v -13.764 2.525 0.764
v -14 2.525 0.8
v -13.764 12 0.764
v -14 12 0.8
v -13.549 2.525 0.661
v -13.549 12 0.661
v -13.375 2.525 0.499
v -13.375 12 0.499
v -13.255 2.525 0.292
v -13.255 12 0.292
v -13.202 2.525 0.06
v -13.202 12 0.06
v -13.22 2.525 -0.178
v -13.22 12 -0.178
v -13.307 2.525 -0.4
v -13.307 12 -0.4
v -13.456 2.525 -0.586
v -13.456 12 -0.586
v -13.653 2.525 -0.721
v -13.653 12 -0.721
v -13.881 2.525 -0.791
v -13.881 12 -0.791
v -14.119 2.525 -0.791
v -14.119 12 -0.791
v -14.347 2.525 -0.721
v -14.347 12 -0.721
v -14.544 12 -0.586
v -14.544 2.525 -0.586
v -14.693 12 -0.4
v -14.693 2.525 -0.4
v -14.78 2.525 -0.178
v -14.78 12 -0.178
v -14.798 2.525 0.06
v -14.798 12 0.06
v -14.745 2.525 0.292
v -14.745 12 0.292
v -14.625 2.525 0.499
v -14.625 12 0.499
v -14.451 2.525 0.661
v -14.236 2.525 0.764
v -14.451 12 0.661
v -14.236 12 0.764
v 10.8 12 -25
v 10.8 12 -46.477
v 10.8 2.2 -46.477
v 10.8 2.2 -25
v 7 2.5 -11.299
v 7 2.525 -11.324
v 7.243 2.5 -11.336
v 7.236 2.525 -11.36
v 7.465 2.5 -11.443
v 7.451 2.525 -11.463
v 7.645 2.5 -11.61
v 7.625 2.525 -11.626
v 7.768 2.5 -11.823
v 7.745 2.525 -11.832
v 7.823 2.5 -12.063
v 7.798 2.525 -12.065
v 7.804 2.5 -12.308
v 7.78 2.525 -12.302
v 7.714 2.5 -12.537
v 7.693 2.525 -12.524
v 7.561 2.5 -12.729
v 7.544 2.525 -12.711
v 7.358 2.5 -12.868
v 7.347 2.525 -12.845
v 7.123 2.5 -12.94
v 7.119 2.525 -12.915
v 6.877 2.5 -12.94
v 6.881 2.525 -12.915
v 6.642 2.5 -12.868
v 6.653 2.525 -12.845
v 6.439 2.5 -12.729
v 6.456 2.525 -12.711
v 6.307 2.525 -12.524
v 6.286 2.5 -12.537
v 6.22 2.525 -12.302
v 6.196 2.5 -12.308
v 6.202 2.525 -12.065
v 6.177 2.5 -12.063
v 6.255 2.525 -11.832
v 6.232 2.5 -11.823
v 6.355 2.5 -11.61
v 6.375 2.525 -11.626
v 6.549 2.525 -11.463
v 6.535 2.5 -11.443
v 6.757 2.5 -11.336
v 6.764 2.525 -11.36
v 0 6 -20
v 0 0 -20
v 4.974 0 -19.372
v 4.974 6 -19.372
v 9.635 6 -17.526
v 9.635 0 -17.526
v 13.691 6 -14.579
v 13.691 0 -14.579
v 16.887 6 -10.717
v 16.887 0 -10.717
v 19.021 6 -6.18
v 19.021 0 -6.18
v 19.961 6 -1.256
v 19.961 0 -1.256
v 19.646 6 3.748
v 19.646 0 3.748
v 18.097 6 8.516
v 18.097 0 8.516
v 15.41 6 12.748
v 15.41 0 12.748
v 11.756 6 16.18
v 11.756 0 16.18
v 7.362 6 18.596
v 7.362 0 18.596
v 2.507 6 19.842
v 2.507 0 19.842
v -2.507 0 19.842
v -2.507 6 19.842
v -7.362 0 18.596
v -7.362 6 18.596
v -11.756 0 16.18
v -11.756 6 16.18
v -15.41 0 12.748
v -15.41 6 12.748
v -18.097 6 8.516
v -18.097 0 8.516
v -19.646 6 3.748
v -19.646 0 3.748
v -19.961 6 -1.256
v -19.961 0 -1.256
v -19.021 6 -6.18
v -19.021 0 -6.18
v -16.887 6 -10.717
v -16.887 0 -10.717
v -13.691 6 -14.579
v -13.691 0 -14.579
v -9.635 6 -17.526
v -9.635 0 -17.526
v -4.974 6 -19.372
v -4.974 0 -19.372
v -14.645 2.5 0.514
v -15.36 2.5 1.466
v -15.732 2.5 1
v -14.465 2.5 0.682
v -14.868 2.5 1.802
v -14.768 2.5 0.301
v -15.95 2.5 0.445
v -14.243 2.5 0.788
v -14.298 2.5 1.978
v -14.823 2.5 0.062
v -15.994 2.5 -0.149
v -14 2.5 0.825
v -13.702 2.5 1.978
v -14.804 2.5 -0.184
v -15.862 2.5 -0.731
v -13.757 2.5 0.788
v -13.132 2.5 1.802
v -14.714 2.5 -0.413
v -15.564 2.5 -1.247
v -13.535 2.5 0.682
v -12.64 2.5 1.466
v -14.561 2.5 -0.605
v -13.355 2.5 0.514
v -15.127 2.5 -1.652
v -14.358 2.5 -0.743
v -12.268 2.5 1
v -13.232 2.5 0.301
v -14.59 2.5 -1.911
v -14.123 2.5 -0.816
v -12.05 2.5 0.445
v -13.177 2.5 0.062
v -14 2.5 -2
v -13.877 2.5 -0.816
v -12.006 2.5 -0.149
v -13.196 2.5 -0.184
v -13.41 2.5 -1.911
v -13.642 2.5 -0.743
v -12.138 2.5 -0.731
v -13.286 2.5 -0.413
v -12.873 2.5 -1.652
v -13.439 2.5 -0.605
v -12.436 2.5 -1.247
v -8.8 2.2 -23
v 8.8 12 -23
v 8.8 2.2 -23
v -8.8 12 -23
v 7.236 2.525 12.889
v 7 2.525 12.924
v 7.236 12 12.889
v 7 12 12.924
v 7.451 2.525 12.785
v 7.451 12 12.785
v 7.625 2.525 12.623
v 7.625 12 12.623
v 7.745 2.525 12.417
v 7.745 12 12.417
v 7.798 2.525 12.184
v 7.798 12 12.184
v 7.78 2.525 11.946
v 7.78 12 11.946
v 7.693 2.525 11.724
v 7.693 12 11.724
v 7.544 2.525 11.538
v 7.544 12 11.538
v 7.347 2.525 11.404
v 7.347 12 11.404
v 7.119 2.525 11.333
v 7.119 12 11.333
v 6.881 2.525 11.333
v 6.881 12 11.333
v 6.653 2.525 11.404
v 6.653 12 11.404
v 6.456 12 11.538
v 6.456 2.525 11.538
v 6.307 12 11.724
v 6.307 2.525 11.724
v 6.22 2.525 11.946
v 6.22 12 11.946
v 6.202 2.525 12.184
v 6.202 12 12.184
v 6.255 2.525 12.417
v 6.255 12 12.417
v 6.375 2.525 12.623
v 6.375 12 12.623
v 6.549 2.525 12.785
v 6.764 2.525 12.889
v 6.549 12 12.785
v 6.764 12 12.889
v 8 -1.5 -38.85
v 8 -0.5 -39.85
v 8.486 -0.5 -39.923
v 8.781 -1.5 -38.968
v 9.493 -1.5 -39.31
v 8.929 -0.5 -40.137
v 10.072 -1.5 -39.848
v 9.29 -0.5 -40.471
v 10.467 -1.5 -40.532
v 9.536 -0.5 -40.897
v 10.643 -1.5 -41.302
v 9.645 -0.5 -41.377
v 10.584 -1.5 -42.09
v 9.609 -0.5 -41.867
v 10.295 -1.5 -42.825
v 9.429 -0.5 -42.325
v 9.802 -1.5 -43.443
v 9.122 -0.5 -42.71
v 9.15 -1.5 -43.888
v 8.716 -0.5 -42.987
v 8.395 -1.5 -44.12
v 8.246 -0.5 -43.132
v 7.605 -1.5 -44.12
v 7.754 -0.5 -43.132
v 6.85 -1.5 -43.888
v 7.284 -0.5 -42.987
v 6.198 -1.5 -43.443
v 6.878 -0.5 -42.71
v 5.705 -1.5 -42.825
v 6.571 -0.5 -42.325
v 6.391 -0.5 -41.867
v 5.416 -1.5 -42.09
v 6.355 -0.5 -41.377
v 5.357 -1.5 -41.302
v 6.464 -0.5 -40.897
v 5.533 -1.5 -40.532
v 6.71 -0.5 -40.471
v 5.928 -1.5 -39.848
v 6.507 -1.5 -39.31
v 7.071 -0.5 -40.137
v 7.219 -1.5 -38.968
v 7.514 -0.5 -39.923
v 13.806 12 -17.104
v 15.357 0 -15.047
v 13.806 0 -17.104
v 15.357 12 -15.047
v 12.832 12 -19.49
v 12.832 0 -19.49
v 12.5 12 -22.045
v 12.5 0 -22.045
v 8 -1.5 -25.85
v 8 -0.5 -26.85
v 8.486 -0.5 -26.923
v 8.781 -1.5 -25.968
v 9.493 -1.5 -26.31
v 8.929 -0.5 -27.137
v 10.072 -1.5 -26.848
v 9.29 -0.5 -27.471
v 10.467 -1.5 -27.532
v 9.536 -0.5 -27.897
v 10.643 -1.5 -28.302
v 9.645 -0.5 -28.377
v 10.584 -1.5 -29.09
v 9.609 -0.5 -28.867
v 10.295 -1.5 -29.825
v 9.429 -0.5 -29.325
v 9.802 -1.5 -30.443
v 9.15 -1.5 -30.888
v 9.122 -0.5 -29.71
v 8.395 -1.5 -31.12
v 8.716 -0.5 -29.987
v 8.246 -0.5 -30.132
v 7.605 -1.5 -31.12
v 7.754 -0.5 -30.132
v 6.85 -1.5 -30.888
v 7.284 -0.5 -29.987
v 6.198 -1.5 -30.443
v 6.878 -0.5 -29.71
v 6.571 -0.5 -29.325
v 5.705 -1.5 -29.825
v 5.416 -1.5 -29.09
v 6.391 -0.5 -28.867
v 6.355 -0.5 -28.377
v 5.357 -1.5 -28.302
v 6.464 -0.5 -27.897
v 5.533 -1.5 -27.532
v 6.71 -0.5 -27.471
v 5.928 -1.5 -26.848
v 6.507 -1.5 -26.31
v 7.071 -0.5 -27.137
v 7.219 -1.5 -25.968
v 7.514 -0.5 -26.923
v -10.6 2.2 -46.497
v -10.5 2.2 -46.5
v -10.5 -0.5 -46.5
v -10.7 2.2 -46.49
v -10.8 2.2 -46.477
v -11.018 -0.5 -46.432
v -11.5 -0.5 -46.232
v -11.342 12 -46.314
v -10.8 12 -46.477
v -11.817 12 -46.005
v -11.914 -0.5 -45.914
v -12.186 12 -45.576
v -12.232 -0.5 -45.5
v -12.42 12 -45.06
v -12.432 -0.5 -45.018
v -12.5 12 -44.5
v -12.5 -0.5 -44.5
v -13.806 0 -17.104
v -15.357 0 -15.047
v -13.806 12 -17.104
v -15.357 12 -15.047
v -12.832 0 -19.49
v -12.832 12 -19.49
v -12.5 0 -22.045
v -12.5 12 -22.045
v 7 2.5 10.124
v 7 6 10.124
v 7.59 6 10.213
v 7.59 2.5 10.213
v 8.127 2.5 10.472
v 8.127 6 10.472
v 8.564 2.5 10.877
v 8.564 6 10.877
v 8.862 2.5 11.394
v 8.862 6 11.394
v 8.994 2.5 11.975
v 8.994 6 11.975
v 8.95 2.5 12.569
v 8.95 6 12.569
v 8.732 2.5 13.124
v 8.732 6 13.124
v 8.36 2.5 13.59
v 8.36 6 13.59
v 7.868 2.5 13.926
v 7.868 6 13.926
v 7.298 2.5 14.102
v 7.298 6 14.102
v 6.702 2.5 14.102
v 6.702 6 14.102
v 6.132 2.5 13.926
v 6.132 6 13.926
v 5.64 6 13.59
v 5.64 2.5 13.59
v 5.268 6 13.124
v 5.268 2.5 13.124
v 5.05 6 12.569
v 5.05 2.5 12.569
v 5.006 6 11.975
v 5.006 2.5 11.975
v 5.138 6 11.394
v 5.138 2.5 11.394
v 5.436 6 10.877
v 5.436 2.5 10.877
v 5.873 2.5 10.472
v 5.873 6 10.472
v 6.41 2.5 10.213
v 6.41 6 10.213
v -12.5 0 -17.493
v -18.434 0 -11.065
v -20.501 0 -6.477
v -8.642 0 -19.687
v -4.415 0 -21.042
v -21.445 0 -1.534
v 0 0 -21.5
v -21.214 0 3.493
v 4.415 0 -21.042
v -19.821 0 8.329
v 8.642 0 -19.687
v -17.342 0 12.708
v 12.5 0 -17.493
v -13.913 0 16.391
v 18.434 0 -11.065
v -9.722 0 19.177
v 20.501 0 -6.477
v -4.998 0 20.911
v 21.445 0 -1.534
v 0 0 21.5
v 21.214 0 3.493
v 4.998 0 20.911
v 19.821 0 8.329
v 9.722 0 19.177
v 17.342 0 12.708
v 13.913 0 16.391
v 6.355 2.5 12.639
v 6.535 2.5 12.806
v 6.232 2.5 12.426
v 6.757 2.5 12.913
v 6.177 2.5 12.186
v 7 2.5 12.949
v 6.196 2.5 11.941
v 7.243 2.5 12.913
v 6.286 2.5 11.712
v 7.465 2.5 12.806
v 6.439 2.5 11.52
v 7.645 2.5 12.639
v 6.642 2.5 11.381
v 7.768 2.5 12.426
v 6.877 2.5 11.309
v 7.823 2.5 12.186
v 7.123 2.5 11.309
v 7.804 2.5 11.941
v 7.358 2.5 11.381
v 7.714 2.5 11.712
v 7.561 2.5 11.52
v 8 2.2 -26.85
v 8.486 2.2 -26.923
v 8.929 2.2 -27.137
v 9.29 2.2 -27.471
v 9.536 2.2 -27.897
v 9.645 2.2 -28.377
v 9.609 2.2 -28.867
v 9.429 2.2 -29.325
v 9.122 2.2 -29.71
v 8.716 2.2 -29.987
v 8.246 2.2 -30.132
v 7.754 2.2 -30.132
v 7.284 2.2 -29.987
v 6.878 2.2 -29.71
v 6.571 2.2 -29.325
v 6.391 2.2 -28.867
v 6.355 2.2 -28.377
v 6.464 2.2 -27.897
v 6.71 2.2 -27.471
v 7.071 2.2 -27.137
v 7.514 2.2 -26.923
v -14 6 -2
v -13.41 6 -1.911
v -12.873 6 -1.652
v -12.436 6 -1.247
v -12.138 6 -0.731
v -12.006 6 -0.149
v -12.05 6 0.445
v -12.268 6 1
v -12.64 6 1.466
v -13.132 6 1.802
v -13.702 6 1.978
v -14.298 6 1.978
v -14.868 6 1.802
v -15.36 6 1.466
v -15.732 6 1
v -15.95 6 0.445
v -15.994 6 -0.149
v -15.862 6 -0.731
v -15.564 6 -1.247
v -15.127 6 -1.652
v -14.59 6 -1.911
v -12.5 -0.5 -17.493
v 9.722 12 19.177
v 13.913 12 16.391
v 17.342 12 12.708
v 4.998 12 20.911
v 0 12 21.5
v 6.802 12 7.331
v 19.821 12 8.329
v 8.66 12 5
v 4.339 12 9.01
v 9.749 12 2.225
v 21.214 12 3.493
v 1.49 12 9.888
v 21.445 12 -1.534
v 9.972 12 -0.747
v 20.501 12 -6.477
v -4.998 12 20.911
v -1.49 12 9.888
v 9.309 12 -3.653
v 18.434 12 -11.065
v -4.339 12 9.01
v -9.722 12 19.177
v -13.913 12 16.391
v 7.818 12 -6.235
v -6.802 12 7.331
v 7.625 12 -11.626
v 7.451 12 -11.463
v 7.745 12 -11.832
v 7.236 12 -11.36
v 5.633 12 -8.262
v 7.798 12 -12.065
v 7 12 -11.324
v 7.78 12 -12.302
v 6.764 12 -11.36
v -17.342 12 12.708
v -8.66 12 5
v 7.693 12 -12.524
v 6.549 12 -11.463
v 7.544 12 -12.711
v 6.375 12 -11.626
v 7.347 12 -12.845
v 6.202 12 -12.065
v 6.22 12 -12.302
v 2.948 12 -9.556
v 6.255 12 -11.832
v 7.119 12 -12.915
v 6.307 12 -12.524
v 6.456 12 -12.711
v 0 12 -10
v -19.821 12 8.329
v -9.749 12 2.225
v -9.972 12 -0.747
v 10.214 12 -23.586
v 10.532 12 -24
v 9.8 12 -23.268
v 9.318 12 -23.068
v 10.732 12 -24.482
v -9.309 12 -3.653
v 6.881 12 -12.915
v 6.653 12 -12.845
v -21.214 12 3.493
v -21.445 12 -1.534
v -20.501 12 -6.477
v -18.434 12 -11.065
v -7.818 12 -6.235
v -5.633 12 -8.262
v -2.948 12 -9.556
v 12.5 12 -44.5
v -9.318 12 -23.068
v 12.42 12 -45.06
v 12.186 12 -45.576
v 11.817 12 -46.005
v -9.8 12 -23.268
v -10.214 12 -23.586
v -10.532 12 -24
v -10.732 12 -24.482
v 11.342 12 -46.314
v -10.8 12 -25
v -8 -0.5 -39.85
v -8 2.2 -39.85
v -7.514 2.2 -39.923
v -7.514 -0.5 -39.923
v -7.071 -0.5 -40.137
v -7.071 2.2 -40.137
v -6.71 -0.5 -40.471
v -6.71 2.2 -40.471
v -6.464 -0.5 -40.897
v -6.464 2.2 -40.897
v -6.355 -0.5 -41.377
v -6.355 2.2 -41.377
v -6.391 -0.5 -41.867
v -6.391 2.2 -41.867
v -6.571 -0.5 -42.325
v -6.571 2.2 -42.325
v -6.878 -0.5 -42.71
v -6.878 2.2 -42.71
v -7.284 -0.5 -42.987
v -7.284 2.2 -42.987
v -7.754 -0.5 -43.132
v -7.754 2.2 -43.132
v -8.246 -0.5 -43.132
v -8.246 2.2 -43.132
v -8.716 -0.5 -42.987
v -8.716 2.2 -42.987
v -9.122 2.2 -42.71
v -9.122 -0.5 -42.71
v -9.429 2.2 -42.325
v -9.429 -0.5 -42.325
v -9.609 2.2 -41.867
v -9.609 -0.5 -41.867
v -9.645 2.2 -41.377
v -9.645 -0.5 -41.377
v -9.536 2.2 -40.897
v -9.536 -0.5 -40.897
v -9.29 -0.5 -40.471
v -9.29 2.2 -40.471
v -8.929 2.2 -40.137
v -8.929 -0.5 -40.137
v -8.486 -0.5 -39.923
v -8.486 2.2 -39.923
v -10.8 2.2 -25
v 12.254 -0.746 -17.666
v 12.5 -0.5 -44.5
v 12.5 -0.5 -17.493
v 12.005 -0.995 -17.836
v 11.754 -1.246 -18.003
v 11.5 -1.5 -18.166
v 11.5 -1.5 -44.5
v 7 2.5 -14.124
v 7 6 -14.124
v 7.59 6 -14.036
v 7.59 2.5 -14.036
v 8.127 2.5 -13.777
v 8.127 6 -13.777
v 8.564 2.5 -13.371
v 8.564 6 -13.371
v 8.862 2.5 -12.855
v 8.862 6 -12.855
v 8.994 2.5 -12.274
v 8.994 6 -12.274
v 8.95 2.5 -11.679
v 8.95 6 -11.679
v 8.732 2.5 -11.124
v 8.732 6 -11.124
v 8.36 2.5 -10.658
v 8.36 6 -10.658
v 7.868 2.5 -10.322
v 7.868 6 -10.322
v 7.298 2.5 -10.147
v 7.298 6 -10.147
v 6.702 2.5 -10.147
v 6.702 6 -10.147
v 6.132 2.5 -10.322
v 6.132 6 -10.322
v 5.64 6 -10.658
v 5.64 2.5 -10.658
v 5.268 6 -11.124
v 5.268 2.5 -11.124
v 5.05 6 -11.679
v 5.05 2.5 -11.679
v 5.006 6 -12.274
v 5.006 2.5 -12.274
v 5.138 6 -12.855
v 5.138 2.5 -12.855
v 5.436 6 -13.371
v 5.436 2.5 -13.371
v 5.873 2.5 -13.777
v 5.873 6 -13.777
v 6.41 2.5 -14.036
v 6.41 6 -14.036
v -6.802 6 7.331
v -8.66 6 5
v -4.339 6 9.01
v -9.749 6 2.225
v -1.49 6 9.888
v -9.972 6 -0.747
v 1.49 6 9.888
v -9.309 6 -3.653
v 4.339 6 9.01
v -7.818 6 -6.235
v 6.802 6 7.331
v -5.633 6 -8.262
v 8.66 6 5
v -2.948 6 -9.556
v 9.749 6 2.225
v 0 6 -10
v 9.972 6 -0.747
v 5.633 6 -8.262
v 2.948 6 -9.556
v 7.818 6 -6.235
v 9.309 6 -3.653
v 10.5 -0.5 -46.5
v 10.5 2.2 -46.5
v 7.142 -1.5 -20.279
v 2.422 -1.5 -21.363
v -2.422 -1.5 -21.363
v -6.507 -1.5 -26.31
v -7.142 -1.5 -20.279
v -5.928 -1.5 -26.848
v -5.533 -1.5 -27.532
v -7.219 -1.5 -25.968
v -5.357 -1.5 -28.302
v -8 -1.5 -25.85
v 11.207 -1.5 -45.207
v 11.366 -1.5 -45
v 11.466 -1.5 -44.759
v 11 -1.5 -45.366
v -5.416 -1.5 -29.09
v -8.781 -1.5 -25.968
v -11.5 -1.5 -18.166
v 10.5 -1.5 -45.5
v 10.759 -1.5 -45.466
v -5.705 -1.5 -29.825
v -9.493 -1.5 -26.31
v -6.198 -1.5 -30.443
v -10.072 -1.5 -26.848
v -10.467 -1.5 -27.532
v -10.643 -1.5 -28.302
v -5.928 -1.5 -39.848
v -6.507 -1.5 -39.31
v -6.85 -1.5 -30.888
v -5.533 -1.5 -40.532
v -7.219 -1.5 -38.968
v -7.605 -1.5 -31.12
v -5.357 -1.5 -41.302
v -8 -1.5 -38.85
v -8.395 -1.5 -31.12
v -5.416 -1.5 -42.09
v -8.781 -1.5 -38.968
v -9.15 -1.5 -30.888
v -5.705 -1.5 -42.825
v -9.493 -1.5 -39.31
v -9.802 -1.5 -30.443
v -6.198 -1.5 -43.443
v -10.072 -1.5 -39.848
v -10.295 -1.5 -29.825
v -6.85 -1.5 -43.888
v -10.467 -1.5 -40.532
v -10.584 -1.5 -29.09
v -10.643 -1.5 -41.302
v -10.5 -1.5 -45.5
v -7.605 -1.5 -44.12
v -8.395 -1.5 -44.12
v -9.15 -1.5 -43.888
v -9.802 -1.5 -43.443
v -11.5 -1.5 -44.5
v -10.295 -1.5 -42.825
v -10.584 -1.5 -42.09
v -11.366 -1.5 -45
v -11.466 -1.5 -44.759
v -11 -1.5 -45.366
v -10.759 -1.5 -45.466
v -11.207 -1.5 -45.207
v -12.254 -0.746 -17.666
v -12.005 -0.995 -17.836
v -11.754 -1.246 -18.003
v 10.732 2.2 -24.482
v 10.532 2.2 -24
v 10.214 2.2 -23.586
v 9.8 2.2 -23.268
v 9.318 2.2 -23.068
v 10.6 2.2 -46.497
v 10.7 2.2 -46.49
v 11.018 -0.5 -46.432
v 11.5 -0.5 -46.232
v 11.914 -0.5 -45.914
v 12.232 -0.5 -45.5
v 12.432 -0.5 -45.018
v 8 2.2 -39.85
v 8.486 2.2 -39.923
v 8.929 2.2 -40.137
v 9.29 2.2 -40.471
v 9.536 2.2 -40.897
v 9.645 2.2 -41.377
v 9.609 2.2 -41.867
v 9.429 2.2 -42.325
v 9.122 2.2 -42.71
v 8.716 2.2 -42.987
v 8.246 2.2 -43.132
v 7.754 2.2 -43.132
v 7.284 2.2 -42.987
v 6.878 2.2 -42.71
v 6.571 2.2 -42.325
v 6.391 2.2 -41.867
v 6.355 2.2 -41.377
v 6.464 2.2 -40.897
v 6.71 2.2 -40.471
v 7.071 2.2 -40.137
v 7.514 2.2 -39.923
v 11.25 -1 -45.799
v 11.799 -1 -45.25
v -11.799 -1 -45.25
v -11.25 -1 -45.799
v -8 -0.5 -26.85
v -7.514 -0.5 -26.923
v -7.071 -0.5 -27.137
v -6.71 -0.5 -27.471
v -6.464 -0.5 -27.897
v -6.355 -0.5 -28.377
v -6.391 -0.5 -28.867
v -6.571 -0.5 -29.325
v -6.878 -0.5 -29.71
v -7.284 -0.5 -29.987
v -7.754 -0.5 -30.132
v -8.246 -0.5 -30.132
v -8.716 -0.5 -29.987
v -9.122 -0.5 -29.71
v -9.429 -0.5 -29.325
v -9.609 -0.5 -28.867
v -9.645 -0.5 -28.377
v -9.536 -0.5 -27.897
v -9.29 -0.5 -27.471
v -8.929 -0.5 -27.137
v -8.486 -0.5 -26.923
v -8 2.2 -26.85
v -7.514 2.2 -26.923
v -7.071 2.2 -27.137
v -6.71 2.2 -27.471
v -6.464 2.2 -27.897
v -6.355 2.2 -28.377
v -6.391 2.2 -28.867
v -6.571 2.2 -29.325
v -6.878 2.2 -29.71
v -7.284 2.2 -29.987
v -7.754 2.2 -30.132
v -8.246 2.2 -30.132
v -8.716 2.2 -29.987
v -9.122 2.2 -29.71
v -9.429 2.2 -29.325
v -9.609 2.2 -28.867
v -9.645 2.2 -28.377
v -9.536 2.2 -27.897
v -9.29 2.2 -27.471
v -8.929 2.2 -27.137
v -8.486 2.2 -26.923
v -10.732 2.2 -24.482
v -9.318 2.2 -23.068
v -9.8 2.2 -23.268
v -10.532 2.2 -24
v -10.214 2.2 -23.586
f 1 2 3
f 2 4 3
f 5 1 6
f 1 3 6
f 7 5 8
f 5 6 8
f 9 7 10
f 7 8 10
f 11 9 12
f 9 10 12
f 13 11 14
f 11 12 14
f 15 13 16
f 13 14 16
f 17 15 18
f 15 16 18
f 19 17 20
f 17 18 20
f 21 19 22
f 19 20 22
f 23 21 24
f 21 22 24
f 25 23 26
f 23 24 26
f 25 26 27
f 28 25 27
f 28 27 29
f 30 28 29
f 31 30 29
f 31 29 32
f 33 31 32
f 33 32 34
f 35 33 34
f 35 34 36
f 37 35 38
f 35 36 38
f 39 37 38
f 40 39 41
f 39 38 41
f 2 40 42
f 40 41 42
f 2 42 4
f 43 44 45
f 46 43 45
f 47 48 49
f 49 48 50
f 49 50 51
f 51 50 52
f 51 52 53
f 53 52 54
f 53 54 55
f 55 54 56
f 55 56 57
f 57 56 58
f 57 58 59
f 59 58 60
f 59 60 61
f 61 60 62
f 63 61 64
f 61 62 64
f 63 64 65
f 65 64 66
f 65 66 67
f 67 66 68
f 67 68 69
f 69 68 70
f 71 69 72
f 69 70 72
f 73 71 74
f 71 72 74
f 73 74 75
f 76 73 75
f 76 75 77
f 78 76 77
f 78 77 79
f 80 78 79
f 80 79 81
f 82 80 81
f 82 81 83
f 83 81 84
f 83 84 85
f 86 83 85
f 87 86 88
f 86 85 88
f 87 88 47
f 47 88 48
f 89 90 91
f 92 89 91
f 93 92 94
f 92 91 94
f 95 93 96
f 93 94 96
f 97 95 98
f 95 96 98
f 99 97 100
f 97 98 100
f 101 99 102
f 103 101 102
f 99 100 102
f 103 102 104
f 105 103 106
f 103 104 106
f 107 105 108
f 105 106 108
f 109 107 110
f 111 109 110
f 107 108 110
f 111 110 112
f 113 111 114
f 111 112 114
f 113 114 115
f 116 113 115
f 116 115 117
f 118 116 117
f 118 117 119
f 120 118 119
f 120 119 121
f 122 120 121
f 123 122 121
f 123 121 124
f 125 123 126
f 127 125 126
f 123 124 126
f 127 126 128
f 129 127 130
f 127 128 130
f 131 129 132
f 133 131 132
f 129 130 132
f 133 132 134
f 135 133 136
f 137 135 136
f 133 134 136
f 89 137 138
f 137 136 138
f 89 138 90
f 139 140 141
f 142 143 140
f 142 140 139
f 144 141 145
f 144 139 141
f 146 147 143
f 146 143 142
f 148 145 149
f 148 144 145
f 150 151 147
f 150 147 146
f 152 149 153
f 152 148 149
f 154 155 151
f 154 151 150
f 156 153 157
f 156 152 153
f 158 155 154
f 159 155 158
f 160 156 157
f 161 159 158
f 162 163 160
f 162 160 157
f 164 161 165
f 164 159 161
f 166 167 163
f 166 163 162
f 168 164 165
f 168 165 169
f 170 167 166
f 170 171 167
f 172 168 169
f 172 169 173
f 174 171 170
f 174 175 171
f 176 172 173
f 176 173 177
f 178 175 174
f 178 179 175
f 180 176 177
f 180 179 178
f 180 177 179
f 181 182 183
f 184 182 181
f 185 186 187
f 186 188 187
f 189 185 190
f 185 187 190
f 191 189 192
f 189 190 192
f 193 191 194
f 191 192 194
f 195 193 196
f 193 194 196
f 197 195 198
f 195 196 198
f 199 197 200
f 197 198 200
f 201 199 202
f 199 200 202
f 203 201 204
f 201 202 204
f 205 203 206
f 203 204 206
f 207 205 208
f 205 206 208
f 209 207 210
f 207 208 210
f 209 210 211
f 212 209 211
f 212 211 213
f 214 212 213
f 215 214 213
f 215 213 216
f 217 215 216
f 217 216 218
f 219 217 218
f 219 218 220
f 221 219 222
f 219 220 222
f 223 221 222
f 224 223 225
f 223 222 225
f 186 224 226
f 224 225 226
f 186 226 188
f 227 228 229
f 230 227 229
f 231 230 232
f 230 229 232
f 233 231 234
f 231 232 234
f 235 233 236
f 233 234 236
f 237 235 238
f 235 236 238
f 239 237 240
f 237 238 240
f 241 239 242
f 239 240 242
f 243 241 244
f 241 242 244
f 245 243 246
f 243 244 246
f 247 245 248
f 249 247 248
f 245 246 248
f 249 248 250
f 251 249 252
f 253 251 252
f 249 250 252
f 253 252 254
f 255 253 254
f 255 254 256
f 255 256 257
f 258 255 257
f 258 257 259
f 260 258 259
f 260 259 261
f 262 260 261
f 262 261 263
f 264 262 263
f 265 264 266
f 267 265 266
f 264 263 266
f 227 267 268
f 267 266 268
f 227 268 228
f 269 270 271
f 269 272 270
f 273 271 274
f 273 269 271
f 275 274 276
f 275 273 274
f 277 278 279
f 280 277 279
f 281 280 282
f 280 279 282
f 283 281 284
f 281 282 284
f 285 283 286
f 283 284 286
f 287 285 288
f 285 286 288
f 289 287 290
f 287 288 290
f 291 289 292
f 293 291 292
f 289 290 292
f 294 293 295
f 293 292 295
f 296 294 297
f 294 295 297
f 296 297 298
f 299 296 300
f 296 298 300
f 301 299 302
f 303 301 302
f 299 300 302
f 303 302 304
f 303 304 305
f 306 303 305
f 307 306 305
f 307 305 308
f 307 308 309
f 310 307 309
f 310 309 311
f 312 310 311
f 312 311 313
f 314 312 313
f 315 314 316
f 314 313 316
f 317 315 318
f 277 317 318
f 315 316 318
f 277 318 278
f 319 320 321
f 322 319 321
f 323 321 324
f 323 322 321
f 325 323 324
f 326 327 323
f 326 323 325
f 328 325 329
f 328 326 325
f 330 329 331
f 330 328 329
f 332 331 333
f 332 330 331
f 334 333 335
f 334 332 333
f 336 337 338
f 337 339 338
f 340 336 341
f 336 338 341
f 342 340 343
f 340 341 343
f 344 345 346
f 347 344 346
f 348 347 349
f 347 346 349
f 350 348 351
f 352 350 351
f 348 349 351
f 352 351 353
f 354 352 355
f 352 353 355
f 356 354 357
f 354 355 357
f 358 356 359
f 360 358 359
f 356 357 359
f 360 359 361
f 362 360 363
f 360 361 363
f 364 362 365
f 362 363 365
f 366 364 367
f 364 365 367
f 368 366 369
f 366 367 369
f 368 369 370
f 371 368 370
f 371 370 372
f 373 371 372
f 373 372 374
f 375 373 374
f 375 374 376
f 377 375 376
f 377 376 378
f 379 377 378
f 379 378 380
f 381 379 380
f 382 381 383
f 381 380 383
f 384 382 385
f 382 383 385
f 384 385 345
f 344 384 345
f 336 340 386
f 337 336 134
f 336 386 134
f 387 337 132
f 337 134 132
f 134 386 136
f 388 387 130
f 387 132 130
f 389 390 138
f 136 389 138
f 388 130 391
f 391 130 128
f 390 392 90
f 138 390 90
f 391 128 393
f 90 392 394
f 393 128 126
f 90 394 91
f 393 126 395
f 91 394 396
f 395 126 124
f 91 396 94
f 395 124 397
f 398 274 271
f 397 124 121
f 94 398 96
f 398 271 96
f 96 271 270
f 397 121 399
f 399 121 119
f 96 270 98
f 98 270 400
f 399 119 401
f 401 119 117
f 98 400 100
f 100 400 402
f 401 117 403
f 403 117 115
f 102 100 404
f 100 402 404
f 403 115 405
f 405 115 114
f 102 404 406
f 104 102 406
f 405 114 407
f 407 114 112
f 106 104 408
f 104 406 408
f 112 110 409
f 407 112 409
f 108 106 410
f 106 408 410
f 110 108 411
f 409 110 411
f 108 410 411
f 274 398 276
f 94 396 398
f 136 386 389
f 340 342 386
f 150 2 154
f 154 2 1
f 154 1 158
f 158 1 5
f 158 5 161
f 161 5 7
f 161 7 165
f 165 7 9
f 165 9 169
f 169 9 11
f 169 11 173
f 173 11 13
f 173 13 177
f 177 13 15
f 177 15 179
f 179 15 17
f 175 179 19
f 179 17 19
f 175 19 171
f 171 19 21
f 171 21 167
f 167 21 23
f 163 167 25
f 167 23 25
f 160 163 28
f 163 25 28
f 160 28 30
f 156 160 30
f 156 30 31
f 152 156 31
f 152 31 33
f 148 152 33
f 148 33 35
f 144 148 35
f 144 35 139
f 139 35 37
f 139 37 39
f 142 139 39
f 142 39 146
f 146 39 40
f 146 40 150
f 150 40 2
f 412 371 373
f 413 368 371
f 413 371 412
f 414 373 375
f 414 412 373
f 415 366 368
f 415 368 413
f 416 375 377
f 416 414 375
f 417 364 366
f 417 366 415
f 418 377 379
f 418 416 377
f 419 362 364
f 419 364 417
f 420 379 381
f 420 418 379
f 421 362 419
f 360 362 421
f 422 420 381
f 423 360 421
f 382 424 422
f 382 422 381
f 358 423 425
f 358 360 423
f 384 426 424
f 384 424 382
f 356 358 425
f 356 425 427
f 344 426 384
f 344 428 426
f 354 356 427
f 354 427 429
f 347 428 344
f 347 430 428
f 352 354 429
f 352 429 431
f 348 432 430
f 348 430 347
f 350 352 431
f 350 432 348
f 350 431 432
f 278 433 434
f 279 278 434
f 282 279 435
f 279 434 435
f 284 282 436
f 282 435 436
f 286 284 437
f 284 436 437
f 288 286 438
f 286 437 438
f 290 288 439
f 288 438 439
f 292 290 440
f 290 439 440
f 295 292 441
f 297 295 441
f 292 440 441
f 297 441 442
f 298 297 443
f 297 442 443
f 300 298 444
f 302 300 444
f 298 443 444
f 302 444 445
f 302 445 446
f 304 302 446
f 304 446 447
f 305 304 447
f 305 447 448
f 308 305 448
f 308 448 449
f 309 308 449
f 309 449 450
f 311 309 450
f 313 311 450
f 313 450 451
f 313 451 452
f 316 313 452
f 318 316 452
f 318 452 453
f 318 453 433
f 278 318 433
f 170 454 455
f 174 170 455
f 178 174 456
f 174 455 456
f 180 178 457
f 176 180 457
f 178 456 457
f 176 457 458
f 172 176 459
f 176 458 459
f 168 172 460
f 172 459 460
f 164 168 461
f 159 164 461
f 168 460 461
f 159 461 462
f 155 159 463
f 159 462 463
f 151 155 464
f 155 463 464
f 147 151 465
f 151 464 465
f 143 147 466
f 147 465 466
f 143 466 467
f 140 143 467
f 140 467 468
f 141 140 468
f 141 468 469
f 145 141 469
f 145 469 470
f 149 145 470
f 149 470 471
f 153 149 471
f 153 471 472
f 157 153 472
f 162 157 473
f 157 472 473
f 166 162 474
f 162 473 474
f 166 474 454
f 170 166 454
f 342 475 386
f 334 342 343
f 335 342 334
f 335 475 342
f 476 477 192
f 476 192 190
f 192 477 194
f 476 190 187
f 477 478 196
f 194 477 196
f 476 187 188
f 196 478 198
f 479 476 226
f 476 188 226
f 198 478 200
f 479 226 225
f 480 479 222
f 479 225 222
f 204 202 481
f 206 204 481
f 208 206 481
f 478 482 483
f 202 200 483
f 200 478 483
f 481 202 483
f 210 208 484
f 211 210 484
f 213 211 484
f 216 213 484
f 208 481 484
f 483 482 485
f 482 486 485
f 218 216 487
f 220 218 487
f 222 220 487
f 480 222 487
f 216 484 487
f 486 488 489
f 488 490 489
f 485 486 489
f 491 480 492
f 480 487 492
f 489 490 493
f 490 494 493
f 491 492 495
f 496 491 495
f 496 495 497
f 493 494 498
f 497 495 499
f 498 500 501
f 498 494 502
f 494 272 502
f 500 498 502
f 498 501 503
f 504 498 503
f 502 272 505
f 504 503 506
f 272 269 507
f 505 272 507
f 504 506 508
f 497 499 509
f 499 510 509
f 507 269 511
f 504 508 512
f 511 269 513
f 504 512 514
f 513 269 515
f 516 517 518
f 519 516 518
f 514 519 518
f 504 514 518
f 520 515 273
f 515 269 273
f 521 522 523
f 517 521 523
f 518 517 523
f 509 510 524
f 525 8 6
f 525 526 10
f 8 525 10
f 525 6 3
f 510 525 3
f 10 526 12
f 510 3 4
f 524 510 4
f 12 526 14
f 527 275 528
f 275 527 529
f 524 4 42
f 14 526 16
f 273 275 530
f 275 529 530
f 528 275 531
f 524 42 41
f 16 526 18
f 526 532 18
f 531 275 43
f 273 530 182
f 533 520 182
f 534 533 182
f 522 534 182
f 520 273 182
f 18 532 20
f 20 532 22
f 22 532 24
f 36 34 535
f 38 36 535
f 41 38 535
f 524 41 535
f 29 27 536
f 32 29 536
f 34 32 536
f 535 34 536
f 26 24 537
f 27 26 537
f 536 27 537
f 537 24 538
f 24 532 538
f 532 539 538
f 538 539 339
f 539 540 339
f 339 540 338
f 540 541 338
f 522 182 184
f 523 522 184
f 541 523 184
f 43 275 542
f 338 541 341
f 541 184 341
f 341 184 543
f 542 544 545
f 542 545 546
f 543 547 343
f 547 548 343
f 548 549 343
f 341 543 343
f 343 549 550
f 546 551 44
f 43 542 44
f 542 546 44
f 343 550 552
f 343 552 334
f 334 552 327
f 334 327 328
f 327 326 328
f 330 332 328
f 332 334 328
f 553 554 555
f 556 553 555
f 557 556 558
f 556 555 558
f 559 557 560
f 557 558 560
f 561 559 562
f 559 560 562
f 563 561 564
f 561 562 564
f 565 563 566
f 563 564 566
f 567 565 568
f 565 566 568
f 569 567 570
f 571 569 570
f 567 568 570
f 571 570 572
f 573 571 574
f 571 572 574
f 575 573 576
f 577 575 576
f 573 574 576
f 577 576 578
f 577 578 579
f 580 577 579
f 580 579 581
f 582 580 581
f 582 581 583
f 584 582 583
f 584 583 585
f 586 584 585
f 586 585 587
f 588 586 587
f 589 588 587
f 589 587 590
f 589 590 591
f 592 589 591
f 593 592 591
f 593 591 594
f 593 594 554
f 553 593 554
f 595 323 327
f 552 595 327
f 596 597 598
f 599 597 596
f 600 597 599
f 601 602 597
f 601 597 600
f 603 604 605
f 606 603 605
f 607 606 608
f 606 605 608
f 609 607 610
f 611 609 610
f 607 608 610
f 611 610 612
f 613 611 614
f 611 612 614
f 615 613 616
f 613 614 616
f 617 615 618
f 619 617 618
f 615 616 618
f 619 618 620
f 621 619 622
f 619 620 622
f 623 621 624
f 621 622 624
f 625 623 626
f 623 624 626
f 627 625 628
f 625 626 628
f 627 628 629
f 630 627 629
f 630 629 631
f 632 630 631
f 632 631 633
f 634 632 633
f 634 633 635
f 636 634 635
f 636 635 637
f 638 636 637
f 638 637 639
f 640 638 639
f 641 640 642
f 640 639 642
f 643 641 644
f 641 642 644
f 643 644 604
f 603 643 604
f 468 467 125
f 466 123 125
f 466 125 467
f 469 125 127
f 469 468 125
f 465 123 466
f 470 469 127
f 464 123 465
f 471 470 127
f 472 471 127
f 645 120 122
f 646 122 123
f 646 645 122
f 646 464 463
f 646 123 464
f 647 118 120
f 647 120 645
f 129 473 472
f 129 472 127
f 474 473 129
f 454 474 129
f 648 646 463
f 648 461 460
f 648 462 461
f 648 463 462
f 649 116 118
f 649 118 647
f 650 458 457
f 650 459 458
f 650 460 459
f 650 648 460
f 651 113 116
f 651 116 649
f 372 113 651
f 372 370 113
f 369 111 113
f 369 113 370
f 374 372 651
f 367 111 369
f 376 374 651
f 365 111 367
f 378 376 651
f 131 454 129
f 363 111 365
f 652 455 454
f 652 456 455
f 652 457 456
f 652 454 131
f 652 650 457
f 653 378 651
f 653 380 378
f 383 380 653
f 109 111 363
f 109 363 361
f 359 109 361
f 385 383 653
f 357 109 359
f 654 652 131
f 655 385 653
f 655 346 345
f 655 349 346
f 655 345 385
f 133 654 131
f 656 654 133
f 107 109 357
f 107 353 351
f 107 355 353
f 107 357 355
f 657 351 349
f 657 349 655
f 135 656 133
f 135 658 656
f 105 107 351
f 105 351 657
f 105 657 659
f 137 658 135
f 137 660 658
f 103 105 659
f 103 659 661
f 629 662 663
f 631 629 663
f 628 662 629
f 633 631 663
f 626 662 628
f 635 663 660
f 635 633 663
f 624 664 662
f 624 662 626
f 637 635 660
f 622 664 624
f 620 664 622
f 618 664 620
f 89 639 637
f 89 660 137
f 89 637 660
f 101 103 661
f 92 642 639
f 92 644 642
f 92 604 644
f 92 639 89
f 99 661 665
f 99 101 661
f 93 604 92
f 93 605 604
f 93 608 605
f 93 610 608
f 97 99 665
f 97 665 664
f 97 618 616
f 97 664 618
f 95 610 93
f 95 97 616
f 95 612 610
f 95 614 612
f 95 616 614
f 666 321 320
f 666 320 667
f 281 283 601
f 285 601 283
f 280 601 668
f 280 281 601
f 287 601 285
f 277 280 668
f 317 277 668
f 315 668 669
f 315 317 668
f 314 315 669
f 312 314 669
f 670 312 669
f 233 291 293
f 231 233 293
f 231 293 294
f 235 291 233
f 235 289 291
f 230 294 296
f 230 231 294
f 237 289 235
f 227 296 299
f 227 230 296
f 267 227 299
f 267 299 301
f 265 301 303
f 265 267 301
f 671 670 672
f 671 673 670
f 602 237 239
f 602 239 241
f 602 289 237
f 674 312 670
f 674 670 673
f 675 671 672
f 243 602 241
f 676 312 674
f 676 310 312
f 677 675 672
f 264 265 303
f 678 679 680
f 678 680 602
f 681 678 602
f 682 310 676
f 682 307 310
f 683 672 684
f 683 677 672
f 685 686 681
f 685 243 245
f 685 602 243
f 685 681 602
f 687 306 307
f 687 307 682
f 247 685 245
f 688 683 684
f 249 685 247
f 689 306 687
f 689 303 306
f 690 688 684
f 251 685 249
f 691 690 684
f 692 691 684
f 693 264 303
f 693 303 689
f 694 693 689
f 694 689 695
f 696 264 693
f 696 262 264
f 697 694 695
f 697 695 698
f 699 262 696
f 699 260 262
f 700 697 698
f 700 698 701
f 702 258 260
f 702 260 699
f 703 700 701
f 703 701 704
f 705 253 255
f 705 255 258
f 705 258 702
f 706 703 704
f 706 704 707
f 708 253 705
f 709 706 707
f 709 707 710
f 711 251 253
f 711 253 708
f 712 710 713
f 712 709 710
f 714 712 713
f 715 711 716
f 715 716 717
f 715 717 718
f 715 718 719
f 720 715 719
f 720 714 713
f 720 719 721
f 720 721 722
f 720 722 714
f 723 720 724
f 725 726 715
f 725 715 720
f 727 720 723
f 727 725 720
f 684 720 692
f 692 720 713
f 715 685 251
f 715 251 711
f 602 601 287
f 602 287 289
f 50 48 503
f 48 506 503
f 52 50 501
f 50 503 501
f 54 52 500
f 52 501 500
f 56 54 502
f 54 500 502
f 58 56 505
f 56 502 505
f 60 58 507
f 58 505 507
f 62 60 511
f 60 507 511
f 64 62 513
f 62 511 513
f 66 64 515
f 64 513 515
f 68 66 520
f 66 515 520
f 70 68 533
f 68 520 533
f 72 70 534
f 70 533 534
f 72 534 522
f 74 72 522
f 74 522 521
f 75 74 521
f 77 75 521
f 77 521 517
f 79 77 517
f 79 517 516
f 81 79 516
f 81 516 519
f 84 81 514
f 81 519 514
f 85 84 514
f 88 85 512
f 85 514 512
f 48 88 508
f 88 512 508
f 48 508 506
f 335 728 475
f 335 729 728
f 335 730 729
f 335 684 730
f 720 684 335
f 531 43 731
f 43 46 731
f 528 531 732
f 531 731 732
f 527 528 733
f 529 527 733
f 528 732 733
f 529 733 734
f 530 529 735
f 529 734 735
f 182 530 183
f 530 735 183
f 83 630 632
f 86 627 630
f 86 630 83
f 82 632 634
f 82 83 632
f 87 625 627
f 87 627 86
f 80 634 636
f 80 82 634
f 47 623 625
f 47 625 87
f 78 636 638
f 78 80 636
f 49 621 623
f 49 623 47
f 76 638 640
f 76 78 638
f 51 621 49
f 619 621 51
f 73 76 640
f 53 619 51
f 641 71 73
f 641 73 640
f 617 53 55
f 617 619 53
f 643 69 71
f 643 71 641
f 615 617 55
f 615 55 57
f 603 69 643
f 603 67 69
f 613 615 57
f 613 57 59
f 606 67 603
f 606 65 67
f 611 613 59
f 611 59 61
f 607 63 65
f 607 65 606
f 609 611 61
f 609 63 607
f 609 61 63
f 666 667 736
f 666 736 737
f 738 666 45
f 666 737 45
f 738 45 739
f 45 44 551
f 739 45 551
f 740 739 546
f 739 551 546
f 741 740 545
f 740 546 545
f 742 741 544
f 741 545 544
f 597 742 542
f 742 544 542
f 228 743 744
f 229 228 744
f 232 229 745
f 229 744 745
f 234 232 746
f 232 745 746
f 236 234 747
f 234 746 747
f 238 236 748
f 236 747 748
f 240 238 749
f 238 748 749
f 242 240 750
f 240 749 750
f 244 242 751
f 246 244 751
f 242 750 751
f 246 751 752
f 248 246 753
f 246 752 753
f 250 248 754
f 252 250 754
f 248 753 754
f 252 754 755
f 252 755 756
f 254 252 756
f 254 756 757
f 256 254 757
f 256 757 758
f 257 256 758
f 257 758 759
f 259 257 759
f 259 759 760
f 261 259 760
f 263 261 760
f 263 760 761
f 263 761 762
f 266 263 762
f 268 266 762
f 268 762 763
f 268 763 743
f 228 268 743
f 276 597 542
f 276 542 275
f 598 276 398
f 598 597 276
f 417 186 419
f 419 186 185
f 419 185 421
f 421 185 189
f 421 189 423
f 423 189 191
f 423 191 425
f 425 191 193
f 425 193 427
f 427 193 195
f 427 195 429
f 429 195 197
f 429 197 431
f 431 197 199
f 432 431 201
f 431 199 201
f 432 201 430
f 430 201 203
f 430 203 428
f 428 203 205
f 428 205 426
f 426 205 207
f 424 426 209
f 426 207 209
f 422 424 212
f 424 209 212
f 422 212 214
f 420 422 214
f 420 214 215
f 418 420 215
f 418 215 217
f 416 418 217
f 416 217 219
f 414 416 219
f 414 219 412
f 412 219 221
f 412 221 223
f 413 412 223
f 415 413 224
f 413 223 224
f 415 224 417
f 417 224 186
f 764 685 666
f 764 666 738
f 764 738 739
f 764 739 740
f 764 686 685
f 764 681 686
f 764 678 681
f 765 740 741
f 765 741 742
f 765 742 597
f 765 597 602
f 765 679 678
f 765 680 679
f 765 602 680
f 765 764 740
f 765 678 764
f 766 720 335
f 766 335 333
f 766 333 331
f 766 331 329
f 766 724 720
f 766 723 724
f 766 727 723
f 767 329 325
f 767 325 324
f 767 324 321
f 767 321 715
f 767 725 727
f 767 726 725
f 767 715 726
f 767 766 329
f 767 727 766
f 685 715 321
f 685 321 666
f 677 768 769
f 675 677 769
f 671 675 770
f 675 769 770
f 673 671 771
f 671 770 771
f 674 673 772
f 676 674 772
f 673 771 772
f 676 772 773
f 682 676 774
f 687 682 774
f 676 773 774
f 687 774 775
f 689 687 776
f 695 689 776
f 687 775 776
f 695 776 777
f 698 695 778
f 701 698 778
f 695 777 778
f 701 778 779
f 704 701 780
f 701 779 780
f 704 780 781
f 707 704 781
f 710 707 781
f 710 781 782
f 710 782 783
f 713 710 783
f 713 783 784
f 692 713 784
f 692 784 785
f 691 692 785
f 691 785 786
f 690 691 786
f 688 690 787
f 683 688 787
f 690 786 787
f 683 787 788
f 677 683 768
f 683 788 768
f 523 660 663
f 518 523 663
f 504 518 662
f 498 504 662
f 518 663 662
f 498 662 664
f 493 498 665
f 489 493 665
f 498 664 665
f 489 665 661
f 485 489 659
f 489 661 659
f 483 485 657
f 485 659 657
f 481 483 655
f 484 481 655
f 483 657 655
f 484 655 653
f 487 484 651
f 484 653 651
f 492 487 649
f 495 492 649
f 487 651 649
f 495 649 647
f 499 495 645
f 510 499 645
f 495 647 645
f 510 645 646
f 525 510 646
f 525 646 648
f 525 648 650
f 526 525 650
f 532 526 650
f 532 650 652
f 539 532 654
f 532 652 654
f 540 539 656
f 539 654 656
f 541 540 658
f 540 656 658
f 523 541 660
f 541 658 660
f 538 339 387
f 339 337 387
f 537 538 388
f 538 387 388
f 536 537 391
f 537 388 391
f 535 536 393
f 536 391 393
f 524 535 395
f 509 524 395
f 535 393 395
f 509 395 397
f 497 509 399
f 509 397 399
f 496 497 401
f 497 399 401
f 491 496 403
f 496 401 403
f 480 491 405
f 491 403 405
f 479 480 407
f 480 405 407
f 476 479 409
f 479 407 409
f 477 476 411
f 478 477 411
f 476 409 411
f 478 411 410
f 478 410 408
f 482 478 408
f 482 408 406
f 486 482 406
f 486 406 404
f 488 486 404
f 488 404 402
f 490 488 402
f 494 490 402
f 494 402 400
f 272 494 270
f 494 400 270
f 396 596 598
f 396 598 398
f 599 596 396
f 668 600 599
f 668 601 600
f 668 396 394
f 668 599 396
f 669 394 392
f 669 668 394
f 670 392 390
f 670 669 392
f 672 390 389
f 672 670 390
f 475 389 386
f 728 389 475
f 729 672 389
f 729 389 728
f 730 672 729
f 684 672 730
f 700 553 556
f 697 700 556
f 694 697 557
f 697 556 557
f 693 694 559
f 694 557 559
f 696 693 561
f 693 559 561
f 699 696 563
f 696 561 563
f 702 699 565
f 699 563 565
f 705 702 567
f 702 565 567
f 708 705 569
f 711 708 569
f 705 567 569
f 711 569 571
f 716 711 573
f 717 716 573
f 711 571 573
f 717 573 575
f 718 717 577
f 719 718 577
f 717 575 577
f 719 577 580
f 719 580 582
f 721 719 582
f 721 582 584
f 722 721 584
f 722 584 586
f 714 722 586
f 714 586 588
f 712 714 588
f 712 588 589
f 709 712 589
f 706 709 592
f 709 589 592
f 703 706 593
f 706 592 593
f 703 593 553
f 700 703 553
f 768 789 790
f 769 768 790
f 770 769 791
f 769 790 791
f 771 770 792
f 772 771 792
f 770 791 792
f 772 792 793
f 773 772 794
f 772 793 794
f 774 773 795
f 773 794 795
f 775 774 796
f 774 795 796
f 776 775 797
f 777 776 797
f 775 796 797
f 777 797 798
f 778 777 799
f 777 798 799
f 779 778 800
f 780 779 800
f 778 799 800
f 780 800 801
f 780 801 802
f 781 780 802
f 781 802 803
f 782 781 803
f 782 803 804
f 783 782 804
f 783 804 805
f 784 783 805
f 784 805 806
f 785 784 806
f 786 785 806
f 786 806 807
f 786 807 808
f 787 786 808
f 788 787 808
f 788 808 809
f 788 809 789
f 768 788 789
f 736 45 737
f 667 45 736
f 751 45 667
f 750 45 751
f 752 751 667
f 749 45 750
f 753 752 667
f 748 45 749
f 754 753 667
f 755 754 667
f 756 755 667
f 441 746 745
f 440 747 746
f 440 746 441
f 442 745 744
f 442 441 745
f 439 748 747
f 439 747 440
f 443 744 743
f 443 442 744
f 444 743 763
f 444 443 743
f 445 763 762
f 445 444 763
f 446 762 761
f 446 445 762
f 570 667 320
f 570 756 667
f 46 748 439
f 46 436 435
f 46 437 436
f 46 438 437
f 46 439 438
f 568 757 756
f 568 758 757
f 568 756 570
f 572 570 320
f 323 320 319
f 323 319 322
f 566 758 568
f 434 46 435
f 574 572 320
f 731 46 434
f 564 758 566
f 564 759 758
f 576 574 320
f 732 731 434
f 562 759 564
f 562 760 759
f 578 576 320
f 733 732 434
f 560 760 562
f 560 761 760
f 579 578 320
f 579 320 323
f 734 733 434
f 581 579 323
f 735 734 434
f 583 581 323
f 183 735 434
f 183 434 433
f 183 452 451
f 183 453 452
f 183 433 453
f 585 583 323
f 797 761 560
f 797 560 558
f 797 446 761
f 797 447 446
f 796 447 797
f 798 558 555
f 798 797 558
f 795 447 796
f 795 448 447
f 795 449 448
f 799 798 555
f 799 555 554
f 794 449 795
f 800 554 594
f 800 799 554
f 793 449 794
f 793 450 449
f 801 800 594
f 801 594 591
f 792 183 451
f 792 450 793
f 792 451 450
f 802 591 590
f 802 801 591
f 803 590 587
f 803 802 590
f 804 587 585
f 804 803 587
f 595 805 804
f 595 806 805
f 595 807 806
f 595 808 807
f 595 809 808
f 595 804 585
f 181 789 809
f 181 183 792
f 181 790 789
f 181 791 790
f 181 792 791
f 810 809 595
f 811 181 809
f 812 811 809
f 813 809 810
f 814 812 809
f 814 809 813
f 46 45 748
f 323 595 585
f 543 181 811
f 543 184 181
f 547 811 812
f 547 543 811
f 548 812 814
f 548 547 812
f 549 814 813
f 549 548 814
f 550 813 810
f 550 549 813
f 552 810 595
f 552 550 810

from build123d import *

# Parameters (mm, degrees)
SKETCH_1_R                   = 21.5
EXTRUDE_1_DEPTH              = 12
EXTRUDE_START                = -13.5
EXTRUDE_2_DEPTH              = 13.5
FILLET_1_R                   = 10
SKETCH_4_R                   = 20
CUT_EXTRUDE_1_DEPTH          = 6
SKETCH_5_R                   = 10
CUT_EXTRUDE_2_DEPTH          = 6
SKETCH_6_R                   = 2
EXTRUDE_3_DEPTH              = 3.5
HOLE_WIZARD_M2_1_D           = 1.6
HOLE_WIZARD_M2_1_CSINK_D     = 1.65
HOLE_WIZARD_M2_1_CSINK_ANGLE = 90
CUT_EXTRUDE_3_DEPTH          = 73.320467366
CUT_EXTRUDE_3_DEPTH_BACK     = 23.5
FILLET_2_R                   = 2
FILLET_3_R                   = 2
CHAMFER_1_SIZE               = 1
SKETCH_9_R                   = 1.65
CUT_EXTRUDE_4_DEPTH          = 23.5
CHAMFER_2_SIZE               = 1


with BuildPart() as part:
    # 草图1 → 凸台-拉伸1 (new body)
    with BuildSketch(Plane(origin=(0, 0, 0), x_dir=(1, 0, 0), z_dir=(0, 1, 0))):
        with Locations(Location((0, 0, 0), (0, 0, 270))):
            Circle(SKETCH_1_R)
    extrude(amount=EXTRUDE_1_DEPTH)

    # 草图3 → 凸台-拉伸2 (add)
    with BuildSketch(Plane(origin=(0, 12, 0), x_dir=(1, 0, 0), z_dir=(0, 1, 0)).offset(EXTRUDE_START)):
        with BuildLine():
            Line((-12.5, 46.5), (12.5, 46.5))
            Line((12.5, 46.5), (12.5, 17.492855685))
            ThreePointArc((12.5, 17.492855685), (0, 21.5), (-12.5, 17.492855685))
            Line((-12.5, 17.492855685), (-12.5, 46.5))
        make_face()
    extrude(amount=EXTRUDE_2_DEPTH)

    # 圆角1
    fillet_1_edges = [part.edges().sort_by_distance(p)[0] for p in [
        (12.5, 6, -17.492855685),
        (-12.5, 6, -17.492855685),
    ]]
    fillet(fillet_1_edges, radius=FILLET_1_R)

    # 草图4 → 切除-拉伸1 (cut)
    with BuildSketch(Plane(origin=(0, 0, 0), x_dir=(-1, 0, 0), z_dir=(0, -1, 0))):
        with Locations(Location((0, 0, 0), (0, 0, 90))):
            Circle(SKETCH_4_R)
    extrude(amount=-CUT_EXTRUDE_1_DEPTH, mode=Mode.SUBTRACT)

    # 草图5 → 切除-拉伸2 (cut)
    with BuildSketch(Plane(origin=(0, 6, 0), x_dir=(-1, 0, 0), z_dir=(0, -1, 0))):
        with Locations(Location((0, 0, 0), (0, 0, 90))):
            Circle(SKETCH_5_R)
    extrude(amount=-CUT_EXTRUDE_2_DEPTH, mode=Mode.SUBTRACT)

    # 草图6 → 凸台-拉伸3 (add)
    with BuildSketch(Plane(origin=(0, 6, 0), x_dir=(-1, 0, 0), z_dir=(0, -1, 0))):
        with Locations(Location((14, 0, 0), (0, 0, 90))):
            Circle(SKETCH_6_R)
        with Locations(Location((-7, -12.124355653, 0), (0, 0, 90))):
            Circle(SKETCH_6_R)
        with Locations(Location((-7, 12.124355653, 0), (0, 0, 90))):
            Circle(SKETCH_6_R)
    extrude(amount=EXTRUDE_3_DEPTH)

    # M2 螺纹孔的螺纹孔钻头1 (through all)
    with Locations(Plane(origin=(7, 2.5, 12.124355653), x_dir=(0, 0, -1), z_dir=(0, -1, 0))):
        with Locations((0, 0), (24.248711306, 0), (12.124355653, -21)):
            CounterSinkHole(HOLE_WIZARD_M2_1_D / 2, HOLE_WIZARD_M2_1_CSINK_D / 2, counter_sink_angle=HOLE_WIZARD_M2_1_CSINK_ANGLE)

    # 草图8 → 切除-拉伸3 (cut, two sides: drawn at the far end of the back side and taken through both)
    with BuildSketch(Plane(origin=(0, 0, -46.5), x_dir=(-1, 0, 0), z_dir=(0, 0, -1)).offset(-CUT_EXTRUDE_3_DEPTH_BACK)):
        Polygon((-10.8, 92.015426872), (-10.8, 12), (-10.8, 2.2), (10.8, 2.2), (10.8, 12), (10.8, 92.015426872), (10.8, 252.046280615), (-10.8, 252.046280615), align=None)
    extrude(amount=CUT_EXTRUDE_3_DEPTH + CUT_EXTRUDE_3_DEPTH_BACK, mode=Mode.SUBTRACT)

    # 圆角2
    fillet_2_edges = [part.edges().sort_by_distance(p)[0] for p in [
        (10.8, 7.1, -23),
        (-10.8, 7.1, -23),
    ]]
    fillet(fillet_2_edges, radius=FILLET_2_R)

    # 圆角3
    fillet_3_edges = [part.edges().sort_by_distance(p)[0] for p in [
        (12.5, 5.25, -46.5),
        (-12.5, 5.25, -46.5),
    ]]
    fillet(fillet_3_edges, radius=FILLET_3_R)

    # 倒角1
    chamfer_1_edges = [part.edges().sort_by_distance(p)[0] for p in [
        (0, -1.5, -46.5),
        (-12.5, -1.5, -30.996427842),
        (-11.914213562, -1.5, -45.914213562),
        (11.914213562, -1.5, -45.914213562),
        (12.5, -1.5, -30.996427842),
    ]]
    chamfer(chamfer_1_edges, length=CHAMFER_1_SIZE)

    # 草图9 → 切除-拉伸4 (cut)
    with BuildSketch(Plane(origin=(0, 2.2, 0), x_dir=(1, 0, 0), z_dir=(0, 1, 0))):
        with Locations(Location((-8, 41.5, 0), (0, 0, 270))):
            Circle(SKETCH_9_R)
        with Locations(Location((-8, 28.5, 0), (0, 0, 270))):
            Circle(SKETCH_9_R)
        with Locations(Location((8, 28.5, 0), (0, 0, 270))):
            Circle(SKETCH_9_R)
        with Locations(Location((8, 41.5, 0), (0, 0, 270))):
            Circle(SKETCH_9_R)
    extrude(amount=-CUT_EXTRUDE_4_DEPTH, mode=Mode.SUBTRACT)

    # 倒角2
    chamfer_2_edges = [part.edges().sort_by_distance(p)[0] for p in [
        (8, -1.5, -43.15),
        (8, -1.5, -30.15),
        (-8, -1.5, -30.15),
        (-8, -1.5, -43.15),
    ]]
    chamfer(chamfer_2_edges, length=CHAMFER_2_SIZE)


solid = part.part
